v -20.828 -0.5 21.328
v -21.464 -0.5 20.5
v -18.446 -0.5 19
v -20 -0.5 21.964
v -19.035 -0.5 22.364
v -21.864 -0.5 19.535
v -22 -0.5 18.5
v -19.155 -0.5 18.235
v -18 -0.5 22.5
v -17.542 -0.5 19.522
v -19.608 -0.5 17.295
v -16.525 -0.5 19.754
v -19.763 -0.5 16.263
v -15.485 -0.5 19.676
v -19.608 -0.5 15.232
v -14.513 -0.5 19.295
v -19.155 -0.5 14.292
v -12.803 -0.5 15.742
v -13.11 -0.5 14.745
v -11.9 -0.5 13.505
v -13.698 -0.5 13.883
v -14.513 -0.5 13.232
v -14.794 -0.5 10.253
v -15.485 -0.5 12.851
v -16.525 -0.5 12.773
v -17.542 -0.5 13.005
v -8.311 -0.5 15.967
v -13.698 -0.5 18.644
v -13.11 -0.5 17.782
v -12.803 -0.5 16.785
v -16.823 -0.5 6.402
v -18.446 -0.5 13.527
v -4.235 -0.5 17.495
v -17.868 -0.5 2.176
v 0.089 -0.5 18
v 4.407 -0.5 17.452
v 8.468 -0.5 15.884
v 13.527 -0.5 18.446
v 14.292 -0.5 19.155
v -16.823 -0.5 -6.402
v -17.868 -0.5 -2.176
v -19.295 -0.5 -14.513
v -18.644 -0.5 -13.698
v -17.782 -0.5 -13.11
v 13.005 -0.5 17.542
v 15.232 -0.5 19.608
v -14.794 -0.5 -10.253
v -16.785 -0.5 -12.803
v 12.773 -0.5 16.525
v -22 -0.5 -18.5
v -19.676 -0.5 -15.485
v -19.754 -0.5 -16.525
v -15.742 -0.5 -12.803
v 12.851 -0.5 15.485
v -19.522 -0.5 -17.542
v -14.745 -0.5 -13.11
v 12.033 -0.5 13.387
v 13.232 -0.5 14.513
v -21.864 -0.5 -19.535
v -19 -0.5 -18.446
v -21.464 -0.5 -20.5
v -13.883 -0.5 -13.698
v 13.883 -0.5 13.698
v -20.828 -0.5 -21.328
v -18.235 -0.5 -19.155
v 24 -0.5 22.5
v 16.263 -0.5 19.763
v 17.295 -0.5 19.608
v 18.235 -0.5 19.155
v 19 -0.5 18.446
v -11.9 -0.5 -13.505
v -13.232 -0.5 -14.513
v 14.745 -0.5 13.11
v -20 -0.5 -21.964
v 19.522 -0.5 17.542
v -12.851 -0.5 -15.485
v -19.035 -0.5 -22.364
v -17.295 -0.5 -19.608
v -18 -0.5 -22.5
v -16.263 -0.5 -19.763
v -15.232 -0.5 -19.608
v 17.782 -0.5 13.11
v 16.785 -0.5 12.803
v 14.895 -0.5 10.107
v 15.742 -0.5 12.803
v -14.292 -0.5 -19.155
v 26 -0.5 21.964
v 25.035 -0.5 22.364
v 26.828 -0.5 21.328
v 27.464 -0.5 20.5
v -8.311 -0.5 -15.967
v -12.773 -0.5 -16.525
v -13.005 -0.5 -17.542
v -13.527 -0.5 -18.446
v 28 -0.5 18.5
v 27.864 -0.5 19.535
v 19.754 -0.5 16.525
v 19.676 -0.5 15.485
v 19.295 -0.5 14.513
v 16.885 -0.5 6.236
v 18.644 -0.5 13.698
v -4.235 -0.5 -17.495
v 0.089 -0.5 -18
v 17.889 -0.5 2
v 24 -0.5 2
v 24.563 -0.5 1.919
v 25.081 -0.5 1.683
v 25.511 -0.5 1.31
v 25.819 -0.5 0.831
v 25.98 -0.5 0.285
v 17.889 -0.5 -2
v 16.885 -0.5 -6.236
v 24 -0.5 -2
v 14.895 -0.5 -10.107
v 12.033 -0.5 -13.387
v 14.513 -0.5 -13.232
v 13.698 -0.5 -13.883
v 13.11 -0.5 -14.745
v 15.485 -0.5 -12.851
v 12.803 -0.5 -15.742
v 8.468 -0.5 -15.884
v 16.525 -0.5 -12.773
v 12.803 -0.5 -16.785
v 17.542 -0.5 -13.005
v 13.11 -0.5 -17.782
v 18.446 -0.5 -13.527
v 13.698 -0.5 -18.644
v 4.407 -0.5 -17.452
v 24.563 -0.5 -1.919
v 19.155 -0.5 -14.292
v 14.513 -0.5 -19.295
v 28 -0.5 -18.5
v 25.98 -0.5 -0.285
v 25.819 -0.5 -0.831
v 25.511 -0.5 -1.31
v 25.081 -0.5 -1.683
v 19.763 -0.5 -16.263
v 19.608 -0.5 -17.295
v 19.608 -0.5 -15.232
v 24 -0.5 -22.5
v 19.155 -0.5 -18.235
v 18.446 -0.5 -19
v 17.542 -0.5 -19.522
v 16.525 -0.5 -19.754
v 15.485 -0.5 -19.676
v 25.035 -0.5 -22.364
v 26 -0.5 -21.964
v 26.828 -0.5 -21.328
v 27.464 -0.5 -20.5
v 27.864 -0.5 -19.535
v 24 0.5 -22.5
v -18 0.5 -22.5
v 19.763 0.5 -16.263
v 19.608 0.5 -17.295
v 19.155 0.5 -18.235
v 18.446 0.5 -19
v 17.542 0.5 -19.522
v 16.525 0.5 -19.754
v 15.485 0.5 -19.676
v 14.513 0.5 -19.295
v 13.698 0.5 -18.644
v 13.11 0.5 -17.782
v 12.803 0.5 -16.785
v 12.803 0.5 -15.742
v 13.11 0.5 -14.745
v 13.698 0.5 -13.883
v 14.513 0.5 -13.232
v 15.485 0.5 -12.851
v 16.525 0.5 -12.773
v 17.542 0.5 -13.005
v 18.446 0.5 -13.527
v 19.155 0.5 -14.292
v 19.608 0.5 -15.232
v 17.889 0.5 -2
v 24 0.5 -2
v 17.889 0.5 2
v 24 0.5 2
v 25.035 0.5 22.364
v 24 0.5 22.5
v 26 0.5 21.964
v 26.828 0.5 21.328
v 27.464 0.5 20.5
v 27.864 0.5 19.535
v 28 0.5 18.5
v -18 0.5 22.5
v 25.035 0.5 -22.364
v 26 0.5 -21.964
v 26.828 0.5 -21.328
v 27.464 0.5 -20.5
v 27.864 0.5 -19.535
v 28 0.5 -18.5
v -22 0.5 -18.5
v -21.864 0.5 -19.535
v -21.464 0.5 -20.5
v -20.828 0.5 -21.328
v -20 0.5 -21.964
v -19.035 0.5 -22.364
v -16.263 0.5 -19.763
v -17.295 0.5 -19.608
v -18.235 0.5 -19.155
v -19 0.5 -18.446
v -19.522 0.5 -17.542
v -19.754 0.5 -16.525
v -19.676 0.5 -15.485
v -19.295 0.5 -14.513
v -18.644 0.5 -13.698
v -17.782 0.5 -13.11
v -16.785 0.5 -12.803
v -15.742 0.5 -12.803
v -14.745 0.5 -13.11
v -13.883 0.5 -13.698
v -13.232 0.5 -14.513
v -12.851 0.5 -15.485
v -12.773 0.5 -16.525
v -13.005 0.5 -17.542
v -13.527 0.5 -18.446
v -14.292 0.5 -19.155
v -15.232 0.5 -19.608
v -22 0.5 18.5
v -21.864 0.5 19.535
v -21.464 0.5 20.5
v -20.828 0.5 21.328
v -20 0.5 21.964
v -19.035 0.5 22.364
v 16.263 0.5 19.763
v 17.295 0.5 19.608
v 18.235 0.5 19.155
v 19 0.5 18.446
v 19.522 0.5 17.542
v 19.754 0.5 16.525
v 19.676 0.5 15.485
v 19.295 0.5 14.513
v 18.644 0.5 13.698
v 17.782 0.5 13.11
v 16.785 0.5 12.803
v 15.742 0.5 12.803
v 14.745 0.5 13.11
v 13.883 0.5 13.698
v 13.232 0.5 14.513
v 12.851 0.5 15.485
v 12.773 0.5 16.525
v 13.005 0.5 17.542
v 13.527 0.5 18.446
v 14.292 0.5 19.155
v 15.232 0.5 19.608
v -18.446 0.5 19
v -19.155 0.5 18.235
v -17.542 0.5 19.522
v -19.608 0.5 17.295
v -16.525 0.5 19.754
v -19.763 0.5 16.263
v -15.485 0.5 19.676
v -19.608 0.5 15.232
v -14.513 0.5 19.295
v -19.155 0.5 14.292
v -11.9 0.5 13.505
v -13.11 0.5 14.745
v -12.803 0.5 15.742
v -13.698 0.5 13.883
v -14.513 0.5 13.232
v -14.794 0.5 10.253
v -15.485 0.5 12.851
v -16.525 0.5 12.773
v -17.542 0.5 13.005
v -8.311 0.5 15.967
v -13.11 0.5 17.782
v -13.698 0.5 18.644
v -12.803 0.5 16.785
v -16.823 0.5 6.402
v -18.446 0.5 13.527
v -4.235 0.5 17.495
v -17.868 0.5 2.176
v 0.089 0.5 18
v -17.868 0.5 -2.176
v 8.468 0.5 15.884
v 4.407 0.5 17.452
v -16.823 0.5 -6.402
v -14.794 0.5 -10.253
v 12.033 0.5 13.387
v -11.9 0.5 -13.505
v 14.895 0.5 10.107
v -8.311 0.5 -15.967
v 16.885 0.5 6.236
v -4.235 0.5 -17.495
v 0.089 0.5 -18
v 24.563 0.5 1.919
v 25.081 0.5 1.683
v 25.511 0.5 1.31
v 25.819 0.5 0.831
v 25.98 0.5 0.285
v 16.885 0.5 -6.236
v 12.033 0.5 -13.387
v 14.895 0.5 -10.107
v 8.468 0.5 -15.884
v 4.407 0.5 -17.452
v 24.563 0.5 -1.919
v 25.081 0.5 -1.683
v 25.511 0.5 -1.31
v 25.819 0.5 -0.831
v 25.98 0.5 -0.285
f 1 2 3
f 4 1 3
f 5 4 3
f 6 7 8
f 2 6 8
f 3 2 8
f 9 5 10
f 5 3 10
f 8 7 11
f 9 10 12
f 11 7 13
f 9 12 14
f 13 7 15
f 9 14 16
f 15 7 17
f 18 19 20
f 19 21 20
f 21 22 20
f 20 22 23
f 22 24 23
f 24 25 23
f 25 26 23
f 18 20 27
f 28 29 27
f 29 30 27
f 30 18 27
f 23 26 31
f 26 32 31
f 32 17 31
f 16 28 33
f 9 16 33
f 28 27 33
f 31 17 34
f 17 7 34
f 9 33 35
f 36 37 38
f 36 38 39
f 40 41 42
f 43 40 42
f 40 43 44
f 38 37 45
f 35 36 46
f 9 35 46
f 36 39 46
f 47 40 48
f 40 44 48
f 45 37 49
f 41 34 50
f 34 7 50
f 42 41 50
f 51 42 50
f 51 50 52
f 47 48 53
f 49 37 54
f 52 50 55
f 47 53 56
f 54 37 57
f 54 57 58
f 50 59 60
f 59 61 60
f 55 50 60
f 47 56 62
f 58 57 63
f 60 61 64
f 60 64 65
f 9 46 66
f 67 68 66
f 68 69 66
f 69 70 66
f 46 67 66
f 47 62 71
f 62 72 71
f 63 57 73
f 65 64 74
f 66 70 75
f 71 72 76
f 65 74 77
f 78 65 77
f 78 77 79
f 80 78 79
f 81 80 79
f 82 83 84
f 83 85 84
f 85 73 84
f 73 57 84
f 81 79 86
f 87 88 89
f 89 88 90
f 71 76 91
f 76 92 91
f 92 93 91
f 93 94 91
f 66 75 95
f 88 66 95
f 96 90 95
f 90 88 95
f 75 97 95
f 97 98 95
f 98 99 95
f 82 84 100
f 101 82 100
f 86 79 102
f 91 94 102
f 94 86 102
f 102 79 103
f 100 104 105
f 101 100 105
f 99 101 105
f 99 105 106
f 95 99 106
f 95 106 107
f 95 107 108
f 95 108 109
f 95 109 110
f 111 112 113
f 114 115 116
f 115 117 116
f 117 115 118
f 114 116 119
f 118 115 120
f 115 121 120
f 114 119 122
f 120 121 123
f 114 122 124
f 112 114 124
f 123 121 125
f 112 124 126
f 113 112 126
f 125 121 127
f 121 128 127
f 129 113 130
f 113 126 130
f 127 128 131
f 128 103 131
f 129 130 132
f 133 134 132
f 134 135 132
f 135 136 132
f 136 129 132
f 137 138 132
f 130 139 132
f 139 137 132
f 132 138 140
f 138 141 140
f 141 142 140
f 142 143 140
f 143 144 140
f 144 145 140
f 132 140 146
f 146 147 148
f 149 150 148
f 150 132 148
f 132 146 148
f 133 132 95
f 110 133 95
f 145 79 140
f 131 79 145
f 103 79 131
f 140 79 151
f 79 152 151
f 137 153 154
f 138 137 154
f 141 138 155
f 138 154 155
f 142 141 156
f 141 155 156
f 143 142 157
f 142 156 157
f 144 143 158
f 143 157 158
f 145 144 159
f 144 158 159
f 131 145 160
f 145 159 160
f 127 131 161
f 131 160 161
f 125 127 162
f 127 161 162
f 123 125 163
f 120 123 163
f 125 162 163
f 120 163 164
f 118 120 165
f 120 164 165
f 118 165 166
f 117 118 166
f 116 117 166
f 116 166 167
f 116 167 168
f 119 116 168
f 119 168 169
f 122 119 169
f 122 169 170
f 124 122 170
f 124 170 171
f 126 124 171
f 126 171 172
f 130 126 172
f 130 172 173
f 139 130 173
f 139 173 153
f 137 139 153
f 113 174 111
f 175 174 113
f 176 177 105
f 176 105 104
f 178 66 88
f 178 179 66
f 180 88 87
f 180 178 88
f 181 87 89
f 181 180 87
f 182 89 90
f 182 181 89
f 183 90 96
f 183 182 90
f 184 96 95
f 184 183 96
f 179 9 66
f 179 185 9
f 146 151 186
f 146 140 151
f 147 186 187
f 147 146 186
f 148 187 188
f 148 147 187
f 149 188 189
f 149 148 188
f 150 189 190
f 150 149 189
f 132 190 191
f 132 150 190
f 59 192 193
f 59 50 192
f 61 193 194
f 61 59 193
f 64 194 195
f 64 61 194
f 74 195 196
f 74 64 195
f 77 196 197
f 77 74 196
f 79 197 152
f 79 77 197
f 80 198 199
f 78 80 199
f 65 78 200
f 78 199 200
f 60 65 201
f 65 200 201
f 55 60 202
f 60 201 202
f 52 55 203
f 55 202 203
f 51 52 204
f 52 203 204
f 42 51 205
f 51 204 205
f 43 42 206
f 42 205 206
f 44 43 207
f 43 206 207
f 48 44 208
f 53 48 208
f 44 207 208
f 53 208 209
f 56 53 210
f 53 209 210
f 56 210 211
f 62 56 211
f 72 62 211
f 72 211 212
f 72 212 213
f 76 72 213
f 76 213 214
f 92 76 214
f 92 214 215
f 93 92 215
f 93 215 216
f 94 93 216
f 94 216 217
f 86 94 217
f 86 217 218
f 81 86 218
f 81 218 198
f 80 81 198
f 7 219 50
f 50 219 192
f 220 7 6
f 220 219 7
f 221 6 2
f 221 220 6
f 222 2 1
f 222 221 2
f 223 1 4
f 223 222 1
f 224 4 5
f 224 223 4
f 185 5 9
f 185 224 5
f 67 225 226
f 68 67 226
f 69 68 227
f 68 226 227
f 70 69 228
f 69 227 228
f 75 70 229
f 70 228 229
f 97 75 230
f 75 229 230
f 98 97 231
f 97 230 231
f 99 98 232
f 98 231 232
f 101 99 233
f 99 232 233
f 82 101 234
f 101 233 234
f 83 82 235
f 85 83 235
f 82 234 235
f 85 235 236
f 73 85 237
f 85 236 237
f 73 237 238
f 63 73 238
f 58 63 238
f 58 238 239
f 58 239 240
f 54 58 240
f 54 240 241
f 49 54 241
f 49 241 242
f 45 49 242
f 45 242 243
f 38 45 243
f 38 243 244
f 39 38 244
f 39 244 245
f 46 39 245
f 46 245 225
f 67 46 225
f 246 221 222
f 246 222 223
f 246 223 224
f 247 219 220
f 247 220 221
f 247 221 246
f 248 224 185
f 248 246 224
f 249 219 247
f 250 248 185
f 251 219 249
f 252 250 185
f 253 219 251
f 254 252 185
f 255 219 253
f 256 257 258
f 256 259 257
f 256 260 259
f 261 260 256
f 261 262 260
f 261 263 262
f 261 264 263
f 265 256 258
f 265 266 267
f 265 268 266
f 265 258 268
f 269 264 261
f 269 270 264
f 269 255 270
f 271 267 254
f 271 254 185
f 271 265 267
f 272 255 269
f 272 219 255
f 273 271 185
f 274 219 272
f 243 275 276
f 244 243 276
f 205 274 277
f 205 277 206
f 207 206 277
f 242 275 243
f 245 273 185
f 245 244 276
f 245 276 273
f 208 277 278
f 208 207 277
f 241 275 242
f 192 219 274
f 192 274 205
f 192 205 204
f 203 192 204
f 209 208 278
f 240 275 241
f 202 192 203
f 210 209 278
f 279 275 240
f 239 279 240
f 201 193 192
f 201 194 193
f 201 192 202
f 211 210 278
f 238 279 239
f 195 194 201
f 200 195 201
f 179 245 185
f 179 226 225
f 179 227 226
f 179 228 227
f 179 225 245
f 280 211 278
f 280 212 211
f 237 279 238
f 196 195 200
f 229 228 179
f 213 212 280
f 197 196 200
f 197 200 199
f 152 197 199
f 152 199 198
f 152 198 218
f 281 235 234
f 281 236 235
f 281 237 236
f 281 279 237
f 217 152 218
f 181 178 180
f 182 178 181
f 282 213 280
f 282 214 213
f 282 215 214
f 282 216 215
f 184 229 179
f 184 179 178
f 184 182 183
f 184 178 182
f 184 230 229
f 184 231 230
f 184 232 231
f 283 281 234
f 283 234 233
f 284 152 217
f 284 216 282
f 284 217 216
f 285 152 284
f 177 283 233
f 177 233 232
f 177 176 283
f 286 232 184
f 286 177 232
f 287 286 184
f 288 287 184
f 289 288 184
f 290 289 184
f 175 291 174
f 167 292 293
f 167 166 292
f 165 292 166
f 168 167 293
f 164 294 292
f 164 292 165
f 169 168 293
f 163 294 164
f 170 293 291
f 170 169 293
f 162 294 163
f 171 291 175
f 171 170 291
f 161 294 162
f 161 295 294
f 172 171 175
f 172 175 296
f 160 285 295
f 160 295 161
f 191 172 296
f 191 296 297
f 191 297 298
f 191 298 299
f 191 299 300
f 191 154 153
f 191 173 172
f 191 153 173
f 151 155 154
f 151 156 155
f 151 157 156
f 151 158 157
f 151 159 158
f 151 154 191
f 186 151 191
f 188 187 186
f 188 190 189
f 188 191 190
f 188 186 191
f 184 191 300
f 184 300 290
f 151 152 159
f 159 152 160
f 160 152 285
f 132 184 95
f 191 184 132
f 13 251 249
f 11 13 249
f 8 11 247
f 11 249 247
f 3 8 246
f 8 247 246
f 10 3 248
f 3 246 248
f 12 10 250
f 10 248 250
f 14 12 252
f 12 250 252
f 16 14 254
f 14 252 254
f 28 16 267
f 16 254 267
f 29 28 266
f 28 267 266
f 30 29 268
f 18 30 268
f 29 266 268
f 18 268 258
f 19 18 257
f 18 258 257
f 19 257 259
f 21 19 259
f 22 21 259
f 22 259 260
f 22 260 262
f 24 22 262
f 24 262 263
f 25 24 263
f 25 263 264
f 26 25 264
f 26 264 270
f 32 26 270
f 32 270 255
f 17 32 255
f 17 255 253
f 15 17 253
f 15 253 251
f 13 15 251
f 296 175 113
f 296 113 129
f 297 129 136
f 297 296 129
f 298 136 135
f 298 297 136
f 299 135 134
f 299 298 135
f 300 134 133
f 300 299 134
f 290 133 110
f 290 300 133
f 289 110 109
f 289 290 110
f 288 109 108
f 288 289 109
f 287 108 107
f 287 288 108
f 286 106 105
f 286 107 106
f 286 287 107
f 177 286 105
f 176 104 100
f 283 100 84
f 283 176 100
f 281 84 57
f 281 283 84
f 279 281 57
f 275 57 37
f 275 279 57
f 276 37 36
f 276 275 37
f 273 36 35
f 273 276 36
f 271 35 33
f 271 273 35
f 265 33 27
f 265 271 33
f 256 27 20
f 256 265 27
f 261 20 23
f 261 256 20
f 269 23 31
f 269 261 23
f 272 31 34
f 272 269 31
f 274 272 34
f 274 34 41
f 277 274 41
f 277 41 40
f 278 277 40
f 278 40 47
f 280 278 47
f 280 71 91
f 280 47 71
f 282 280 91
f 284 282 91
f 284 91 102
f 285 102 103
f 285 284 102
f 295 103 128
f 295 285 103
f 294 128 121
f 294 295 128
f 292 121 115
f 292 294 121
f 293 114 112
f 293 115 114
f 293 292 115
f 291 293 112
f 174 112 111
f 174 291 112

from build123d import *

# Parameters (mm, degrees)
SKETCH1_W         = 50
SKETCH1_H         = 45
BODY_DEPTH        = 0.5
CENTER_HOLE_DEPTH = 2
SKETCH3_R         = 3.5
HOLE_1_DEPTH      = 2
HOLES_2_4_COUNT   = 4
R4_FILLETS_R      = 4


with BuildPart() as part:
    # Sketch1 → Body (new body, symmetric)
    with BuildSketch(Plane(origin=(0, 0, 0), x_dir=(1, 0, 0), z_dir=(0, 1, 0))):
        with Locations((3, 0)):
            Rectangle(SKETCH1_W, SKETCH1_H)
    extrude(amount=BODY_DEPTH, both=True)

    # Sketch2 → Center hole (cut, through all)
    with BuildSketch(Plane(origin=(0, 0.5, 0), x_dir=(1, 0, 0), z_dir=(0, 1, 0))):
        with BuildLine():
            Line((17.88854382, 2), (24, 2))
            ThreePointArc((24, 2), (26, 0), (24, -2))
            Line((24, -2), (17.88854382, -2))
            ThreePointArc((17.88854382, -2), (-18, 0), (17.88854382, 2))
        make_face()
    extrude(amount=-CENTER_HOLE_DEPTH, mode=Mode.SUBTRACT)

    # Sketch3 → Hole 1 (cut, through all)
    with BuildSketch(Plane(origin=(0, 0.5, 0), x_dir=(1, 0, 0), z_dir=(0, 1, 0))):
        with Locations((16.263455967, 16.263455967)):
            Circle(SKETCH3_R)
    hole_1 = extrude(amount=-HOLE_1_DEPTH, mode=Mode.SUBTRACT)

    # Holes 2-4: Hole 1 ×4 about axis
    holes_2_4_axis = Axis((0, 0, 0), (0, 1, 0))
    for i in range(1, HOLES_2_4_COUNT):
        add(hole_1.rotate(holes_2_4_axis, i * 360 / HOLES_2_4_COUNT), mode=Mode.SUBTRACT)

    # R4 Fillets
    r4_fillets_edges = [part.edges().sort_by_distance(p)[0] for p in [
        (-22, 0, -22.5),
        (28, 0, -22.5),
        (28, 0, 22.5),
        (-22, 0, 22.5),
    ]]
    fillet(r4_fillets_edges, radius=R4_FILLETS_R)


solid = part.part
